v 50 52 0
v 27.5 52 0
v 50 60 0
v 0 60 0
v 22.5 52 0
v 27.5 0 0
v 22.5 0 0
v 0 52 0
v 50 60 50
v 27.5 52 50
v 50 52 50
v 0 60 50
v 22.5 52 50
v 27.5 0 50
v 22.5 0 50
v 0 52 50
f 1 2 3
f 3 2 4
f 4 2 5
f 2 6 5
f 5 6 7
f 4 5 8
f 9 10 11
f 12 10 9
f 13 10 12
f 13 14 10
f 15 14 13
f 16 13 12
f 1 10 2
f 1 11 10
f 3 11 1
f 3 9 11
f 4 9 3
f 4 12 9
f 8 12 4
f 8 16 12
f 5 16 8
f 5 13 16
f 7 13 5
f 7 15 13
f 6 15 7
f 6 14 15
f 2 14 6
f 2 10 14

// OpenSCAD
$fn = 32;

// ----------------------------------------------------------------------
// Structural section: tee 50 x 60 mm
// ----------------------------------------------------------------------

// --- parameters (mm) ---
sec_w = 50;               // tee width, X
sec_h = 60;               // tee height, Y
flange_t = 8;             // top flange thickness
web_t = 5;                // web thickness
plate_t = 50;             // cut length, Z (extrusion height)

profile = [[22.5, 0], [27.5, 0], [27.5, 52], [50, 52], [50, 60], [0, 60], [0, 52], [22.5, 52]];  // primary outline, 8 points, counter clockwise

// --- the one profile operation ---
linear_extrude(height = plate_t) polygon(points = profile);
